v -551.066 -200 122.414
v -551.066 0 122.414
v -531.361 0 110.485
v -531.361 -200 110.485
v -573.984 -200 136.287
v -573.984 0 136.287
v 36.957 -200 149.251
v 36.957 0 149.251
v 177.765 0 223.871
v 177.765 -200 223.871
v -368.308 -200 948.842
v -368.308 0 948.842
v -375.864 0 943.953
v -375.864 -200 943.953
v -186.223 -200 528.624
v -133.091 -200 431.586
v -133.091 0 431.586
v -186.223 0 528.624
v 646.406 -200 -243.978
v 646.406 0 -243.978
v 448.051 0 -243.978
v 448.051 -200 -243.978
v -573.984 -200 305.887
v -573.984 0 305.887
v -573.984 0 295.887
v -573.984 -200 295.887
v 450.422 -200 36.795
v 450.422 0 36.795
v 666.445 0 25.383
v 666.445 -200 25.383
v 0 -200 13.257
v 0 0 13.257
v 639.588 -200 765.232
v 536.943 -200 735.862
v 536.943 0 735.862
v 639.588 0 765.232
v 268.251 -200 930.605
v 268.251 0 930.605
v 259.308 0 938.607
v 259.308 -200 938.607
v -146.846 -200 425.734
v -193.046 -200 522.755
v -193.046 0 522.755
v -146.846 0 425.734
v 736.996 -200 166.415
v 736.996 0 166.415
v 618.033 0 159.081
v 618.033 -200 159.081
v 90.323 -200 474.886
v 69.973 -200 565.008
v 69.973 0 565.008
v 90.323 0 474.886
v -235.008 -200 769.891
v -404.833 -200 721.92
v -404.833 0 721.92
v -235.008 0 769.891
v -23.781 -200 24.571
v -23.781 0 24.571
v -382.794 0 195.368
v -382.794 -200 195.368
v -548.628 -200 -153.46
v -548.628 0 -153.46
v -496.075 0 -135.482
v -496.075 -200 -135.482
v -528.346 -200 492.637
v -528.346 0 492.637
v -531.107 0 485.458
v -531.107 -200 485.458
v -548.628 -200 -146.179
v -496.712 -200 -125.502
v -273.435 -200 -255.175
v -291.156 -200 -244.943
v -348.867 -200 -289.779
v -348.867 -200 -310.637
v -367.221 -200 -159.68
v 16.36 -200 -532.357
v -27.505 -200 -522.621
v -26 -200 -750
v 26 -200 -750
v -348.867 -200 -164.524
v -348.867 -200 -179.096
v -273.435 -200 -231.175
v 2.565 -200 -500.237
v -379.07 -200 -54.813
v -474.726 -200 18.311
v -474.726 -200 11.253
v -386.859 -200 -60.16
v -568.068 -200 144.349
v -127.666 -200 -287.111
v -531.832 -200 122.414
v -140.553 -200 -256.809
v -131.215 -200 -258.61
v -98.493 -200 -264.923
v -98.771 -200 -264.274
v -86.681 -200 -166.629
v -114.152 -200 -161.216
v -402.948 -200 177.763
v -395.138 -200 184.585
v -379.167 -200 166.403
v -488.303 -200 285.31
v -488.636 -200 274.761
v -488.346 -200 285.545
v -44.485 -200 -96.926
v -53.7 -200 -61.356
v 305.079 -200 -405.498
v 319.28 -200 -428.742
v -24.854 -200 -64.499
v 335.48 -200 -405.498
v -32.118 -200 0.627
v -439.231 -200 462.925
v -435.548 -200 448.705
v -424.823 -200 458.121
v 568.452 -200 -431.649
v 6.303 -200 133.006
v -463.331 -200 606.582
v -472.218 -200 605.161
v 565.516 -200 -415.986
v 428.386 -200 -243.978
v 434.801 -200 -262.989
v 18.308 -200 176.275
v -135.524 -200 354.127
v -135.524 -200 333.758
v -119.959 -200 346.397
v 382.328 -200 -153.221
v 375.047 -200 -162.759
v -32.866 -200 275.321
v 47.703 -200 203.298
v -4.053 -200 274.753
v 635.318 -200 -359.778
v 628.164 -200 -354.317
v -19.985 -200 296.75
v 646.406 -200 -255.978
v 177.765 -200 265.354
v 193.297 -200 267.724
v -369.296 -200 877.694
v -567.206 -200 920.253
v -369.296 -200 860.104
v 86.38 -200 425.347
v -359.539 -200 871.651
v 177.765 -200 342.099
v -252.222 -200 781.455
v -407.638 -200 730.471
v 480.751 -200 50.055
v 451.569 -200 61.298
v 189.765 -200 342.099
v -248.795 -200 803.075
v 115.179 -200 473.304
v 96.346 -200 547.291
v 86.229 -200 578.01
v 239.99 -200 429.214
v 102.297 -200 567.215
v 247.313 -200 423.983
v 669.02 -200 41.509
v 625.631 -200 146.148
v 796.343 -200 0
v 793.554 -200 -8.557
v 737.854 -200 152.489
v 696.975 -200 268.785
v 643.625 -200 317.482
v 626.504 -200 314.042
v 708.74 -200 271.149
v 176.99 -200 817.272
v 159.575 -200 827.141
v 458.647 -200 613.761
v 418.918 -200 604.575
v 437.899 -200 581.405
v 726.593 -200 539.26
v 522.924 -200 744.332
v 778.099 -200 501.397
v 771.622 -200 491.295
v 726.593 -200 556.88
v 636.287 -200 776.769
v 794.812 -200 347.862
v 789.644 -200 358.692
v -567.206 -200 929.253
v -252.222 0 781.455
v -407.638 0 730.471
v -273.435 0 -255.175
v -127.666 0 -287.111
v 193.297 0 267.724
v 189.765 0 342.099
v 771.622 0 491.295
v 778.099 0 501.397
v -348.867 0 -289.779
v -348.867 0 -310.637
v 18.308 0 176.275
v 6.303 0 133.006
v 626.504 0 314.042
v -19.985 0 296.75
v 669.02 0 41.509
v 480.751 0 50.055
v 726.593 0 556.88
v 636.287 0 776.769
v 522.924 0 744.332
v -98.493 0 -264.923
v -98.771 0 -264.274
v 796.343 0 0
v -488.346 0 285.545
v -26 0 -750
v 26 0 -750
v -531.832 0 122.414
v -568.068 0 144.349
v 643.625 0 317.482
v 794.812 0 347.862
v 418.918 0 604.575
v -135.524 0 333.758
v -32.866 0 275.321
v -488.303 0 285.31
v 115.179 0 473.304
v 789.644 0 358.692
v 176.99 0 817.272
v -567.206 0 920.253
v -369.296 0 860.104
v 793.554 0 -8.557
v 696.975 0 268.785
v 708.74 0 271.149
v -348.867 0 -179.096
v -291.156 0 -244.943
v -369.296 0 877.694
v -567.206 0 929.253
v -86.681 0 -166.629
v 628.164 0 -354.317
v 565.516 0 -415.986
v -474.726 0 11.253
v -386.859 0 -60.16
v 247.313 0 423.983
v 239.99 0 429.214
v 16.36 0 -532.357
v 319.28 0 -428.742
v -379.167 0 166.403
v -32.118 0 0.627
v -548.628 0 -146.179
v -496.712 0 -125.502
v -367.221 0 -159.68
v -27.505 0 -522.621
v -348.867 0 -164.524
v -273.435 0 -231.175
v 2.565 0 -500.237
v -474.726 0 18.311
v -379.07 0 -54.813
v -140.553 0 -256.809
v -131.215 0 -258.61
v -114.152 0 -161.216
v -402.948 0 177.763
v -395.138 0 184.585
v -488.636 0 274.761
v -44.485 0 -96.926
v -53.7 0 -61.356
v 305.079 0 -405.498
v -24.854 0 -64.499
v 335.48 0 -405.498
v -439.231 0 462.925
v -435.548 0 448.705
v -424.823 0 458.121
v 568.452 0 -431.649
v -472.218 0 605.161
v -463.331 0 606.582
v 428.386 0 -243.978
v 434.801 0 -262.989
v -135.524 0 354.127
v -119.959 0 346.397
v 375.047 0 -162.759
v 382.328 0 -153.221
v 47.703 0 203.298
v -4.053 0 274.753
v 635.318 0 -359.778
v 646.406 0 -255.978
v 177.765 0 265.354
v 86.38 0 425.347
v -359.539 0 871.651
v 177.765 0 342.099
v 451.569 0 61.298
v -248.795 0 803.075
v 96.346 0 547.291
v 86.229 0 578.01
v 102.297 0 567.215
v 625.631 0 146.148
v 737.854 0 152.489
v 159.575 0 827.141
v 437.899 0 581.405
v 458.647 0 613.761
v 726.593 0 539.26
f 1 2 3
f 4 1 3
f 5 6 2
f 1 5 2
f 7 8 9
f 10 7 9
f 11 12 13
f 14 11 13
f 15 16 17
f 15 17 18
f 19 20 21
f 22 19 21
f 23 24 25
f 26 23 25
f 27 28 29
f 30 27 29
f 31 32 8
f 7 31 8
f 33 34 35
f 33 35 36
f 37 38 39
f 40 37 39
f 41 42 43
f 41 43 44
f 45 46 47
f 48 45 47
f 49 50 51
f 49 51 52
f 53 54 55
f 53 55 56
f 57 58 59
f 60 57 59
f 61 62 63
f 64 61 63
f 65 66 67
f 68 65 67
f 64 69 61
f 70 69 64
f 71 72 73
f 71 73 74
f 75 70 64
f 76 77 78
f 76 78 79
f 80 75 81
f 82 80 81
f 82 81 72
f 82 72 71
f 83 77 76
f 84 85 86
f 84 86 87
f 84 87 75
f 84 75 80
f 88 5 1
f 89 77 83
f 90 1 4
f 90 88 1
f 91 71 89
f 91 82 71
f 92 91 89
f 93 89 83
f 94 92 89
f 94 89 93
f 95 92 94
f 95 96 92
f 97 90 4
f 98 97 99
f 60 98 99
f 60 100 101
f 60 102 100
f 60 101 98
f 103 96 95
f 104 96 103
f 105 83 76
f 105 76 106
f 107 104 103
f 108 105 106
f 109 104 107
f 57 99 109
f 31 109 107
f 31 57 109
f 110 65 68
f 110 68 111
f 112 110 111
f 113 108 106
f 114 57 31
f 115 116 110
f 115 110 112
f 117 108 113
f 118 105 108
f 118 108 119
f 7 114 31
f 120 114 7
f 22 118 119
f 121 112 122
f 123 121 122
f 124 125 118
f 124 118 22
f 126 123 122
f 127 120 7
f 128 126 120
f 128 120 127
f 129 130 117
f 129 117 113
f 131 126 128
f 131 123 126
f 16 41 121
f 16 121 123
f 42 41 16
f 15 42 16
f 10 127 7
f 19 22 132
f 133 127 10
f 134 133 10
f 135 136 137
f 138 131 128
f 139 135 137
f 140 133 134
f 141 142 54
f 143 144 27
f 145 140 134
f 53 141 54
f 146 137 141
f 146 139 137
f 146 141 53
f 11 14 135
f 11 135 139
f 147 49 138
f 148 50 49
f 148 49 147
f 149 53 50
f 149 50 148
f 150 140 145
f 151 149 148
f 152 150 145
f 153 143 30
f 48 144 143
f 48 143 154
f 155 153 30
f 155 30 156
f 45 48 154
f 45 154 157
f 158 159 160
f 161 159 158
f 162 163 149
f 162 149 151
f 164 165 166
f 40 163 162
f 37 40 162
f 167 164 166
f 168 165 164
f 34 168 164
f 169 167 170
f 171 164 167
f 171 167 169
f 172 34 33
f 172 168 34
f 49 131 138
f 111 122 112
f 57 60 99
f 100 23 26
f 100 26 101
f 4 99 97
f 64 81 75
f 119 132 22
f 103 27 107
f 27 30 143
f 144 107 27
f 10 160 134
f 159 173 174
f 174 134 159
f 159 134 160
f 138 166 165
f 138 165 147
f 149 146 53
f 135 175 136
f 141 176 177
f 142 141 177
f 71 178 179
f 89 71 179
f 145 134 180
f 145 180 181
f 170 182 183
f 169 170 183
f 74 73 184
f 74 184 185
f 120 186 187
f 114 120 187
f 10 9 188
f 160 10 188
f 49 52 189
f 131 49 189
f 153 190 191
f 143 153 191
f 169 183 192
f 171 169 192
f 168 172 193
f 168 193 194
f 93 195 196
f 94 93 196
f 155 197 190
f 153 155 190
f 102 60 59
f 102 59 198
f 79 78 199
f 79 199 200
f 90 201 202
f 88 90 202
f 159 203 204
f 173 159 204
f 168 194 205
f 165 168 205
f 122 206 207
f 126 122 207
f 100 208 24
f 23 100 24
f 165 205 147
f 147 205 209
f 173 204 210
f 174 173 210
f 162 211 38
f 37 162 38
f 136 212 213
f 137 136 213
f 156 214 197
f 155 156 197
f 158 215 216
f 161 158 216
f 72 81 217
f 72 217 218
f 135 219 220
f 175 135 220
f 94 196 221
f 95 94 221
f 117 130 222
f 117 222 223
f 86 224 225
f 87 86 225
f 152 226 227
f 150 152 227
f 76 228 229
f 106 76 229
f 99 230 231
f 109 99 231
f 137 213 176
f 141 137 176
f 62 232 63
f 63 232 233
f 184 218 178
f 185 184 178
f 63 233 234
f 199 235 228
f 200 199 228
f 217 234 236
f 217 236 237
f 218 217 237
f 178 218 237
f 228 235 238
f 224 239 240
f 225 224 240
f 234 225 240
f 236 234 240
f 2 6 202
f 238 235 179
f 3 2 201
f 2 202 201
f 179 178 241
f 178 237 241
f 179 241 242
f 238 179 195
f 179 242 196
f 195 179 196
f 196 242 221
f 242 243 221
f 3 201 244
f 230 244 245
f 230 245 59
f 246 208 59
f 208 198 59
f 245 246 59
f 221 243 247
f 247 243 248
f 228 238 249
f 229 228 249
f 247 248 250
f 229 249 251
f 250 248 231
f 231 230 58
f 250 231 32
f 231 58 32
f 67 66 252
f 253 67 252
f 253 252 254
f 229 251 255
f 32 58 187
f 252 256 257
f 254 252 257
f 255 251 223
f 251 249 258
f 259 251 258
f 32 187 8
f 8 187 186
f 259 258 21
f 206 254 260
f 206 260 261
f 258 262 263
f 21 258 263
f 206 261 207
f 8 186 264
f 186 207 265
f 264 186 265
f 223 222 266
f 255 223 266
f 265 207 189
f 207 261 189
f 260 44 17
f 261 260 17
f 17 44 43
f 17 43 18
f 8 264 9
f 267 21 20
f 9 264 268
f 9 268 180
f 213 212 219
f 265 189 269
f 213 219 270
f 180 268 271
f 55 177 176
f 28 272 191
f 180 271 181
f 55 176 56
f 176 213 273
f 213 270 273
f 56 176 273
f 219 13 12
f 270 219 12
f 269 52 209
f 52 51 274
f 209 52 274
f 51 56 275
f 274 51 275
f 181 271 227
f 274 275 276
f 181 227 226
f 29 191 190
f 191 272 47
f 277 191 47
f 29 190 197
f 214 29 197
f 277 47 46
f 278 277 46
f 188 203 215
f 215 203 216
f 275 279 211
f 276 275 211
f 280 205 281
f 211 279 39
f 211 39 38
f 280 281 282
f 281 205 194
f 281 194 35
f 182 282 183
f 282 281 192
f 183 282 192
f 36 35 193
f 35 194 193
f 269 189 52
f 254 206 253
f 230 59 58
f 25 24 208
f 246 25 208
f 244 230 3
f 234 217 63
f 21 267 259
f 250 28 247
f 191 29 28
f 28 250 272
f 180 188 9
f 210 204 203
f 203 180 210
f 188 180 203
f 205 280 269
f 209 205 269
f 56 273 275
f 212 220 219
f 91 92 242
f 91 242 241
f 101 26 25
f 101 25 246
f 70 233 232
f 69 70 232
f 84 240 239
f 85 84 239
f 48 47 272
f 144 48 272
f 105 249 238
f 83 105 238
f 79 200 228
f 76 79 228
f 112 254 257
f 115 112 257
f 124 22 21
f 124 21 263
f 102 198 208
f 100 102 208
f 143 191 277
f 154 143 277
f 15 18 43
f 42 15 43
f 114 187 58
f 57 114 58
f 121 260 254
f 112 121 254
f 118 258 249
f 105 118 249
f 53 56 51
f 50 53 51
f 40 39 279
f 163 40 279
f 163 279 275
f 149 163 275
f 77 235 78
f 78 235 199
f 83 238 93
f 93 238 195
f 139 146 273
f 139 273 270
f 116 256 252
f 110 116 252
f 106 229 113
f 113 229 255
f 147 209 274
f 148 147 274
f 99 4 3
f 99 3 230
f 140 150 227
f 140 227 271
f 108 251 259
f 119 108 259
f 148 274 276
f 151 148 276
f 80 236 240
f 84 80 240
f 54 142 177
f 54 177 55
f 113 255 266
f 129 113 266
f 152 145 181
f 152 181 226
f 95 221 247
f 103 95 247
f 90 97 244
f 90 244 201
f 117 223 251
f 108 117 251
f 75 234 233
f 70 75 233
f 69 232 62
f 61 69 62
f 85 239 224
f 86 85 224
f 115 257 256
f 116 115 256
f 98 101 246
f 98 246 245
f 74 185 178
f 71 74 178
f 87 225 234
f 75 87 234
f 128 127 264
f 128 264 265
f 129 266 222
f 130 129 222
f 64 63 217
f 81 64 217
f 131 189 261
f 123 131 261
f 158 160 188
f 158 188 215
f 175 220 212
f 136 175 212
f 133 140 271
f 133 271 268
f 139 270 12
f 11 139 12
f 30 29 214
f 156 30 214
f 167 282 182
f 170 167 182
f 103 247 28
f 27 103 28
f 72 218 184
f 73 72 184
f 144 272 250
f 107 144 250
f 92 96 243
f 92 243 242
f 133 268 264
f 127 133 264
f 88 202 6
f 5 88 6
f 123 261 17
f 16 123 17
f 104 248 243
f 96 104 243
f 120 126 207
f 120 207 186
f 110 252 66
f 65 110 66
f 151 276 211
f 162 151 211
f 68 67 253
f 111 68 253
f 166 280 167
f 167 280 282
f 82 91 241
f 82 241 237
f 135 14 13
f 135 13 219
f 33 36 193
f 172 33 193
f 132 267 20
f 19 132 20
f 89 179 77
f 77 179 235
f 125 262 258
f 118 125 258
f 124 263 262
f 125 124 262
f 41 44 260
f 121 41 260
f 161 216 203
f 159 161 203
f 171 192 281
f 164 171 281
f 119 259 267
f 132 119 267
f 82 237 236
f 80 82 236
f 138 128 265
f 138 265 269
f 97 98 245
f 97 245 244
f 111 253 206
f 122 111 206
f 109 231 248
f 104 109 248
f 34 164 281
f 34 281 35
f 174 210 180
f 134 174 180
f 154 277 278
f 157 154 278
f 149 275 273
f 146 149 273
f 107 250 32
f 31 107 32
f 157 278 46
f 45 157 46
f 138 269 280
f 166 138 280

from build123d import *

# Parameters (mm, degrees)
F1_DEPTH = 200


with BuildPart() as f1:
    # F0 (on Front) → F1 (new body)
    with BuildSketch(Plane.XZ):
        Polygon((-369.296074, 860.103846), (-252.222359, 781.455187), (-248.795434, 803.075274), (-359.538714, 871.651432), (-369.296074, 877.693534), align=None)
        Polygon((86.229337, 578.00982), (102.297463, 567.215454), (176.989675, 817.272305), (159.574956, 827.140868), align=None)
        Polygon((47.703233, 203.298303), (36.957281, 149.250944), (177.764803, 223.871082), (177.764803, 265.354425), align=None)
        Polygon((-395.137998, 184.585006), (-382.793993, 195.368357), (-488.34646, 285.545486), (-488.302618, 285.309941), (-488.635778, 274.76051), align=None)
        Polygon((-531.360984, 110.484615), (-379.167348, 166.403156), (-402.947897, 177.762512), (-531.832361, 122.413635), align=None)
        Polygon((2.565403, -500.237301), (16.359659, -532.357335), (319.279872, -428.741529), (305.078506, -405.49764), align=None)
        Polygon((-19.985075, 296.750159), (-4.052614, 274.753479), (86.380119, 425.346863), (115.178615, 473.303646), (90.32318, 474.886388), align=None)
        Polygon((-27.504601, -522.620559), (16.359659, -532.357335), (2.565403, -500.237301), (-98.492666, -264.92278), (-98.84321, -264.855158), (-131.214753, -258.610427), (-140.553485, -256.808911), (-137.378573, -264.274074), (-127.665923, -287.111413), align=None)
        Polygon((-24.854315, -64.498566), (-44.484516, -96.92555), (450.421533, 36.795169), (467.866212, 41.508619), (451.568961, 61.298091), align=None)
        Polygon((-348.866686, -310.636839), (-273.434583, -255.175081), (-273.434583, -231.175081), (-291.156466, -244.943347), (-348.866686, -289.778855), align=None)
        Polygon((-379.167348, 166.403156), (-32.11826, 0.626743), (-23.780994, 24.570884), (-382.793993, 195.368357), (-395.137998, 184.585006), (-402.947897, 177.762512), align=None)
        Polygon((-439.231479, 462.925151), (-424.822895, 458.121201), (-463.330506, 606.581709), (-472.21759, 605.160534), align=None)
        Polygon((115.178615, 473.303646), (86.380119, 425.346863), (437.898695, 581.404746), (418.918312, 604.574621), align=None)
        Polygon((-404.833034, 721.9197), (-235.007594, 769.890523), (-252.222359, 781.455187), (-407.638371, 730.471313), align=None)
        Polygon((-135.523954, 354.126599), (-119.959313, 346.397221), (-133.090726, 431.585663), (-186.222941, 528.623852), (-193.045956, 522.75474), (-146.845546, 425.733876), align=None)
        Polygon((458.64677, 613.760918), (437.898695, 581.404746), (726.593494, 539.26003), (726.593494, 556.879818), align=None)
        Polygon((636.286535, 776.768744), (522.923824, 744.332003), (536.942677, 735.861683), (639.587648, 765.231731), align=None)
        Polygon((467.866212, 41.508619), (450.421533, 36.795169), (666.4446, 25.382621), (793.553748, -8.556767), (796.343327, 0), (669.01958, 41.508619), (480.751061, 50.054641), align=None)
        Polygon((335.479707, -405.49764), (319.279872, -428.741529), (568.452358, -431.648523), (565.515757, -415.986478), align=None)
        Polygon((-23.780994, 24.570884), (0, 13.257272), (36.957281, 149.250944), (6.303291, 133.006038), align=None)
        Polygon((177.764803, 265.354425), (177.764803, 223.871082), (626.504063, 314.041543), (643.625182, 317.481891), (794.811727, 347.861582), (789.644241, 358.691961), (193.296715, 267.723699), align=None)
        Polygon((-435.548306, 448.704898), (-135.523954, 333.758116), (-135.523954, 354.126599), (-424.822895, 458.121201), align=None)
        Polygon((159.574956, 827.140868), (176.989675, 817.272305), (268.250609, 930.605381), (259.307712, 938.606918), align=None)
        Polygon((-291.156466, -244.943347), (-273.434583, -231.175081), (-348.866686, -164.524183), (-348.866686, -179.095539), align=None)
        Polygon((-114.152497, -161.216129), (-86.680702, -166.629118), (-44.484516, -96.92555), (-24.854315, -64.498566), (-53.700276, -61.355551), align=None)
        Polygon((418.918312, 604.574621), (437.898695, 581.404746), (458.64677, 613.760918), (536.942677, 735.861683), (522.923824, 744.332003), align=None)
        Polygon((-367.221205, -159.679715), (-348.866686, -164.524183), (-379.069601, -54.813134), (-386.85894, -60.159795), align=None)
        Polygon((-135.523954, 333.758116), (-32.865988, 275.321412), (-19.985075, 296.750159), (-119.959313, 346.397221), (-135.523954, 354.126599), align=None)
        Polygon((-98.84321, -264.855158), (-98.492666, -264.92278), (-98.771259, -264.274074), (-86.680702, -166.629118), (-114.152497, -161.216129), (-131.214753, -258.610427), align=None)
        Polygon((-273.434583, -255.175081), (-127.665923, -287.111413), (-137.378573, -264.274074), (-140.553485, -256.808911), (-273.434583, -231.175081), align=None)
        Polygon((736.995518, 166.414723), (618.033409, 159.081429), (625.630806, 146.147769), (737.853944, 152.489179), align=None)
        Polygon((305.078506, -405.49764), (319.279872, -428.741529), (335.479707, -405.49764), (434.80089, -262.989367), (448.050529, -243.978485), (428.385645, -243.978485), align=None)
        Polygon((18.307742, 176.274624), (47.703233, 203.298303), (-4.052614, 274.753479), (-19.985075, 296.750159), (-32.865988, 275.321412), align=None)
        Polygon((375.046786, -162.758924), (428.385645, -243.978485), (448.050529, -243.978485), (382.328452, -153.220721), align=None)
        Polygon((618.033409, 159.081429), (451.568961, 61.298091), (467.866212, 41.508619), (480.751061, 50.054641), (625.630806, 146.147769), align=None)
        Polygon((-567.206264, 920.252979), (-369.296074, 860.103846), (-369.296074, 877.693534), (-567.206264, 929.252979), align=None)
        Polygon((-235.007594, 769.890523), (69.973044, 565.008342), (96.346088, 547.291261), (102.297463, 567.215454), (86.229337, 578.00982), (-248.795434, 803.075274), (-252.222359, 781.455187), align=None)
        Polygon((69.973044, 565.008342), (90.32318, 474.886388), (115.178615, 473.303646), (96.346088, 547.291261), align=None)
        Polygon((-26, -750), (0, -750), (26, -750), (16.359659, -532.357335), (-27.504601, -522.620559), align=None)
        Polygon((177.764803, 342.098653), (177.764803, 265.354425), (193.296715, 267.723699), (189.764803, 342.098653), align=None)
        Polygon((-496.074945, -135.48176), (-496.71203, -125.502074), (-548.627883, -146.178946), (-548.627883, -153.460398), align=None)
        Polygon((726.593494, 556.879818), (726.593494, 539.26003), (771.621823, 491.295099), (778.099352, 501.396665), align=None)
        Polygon((-348.866686, -179.095539), (-348.866686, -164.524183), (-367.221205, -159.679715), (-496.71203, -125.502074), (-496.074945, -135.48176), align=None)
        Polygon((565.515757, -415.986478), (568.452358, -431.648523), (635.317527, -359.778498), (628.163874, -354.317248), align=None)
        Polygon((-369.296074, 877.693534), (-359.538714, 871.651432), (-368.308287, 948.842063), (-375.864416, 943.952799), align=None)
        Polygon((-531.10688, 485.458205), (-435.548306, 448.704898), (-424.822895, 458.121201), (-439.231479, 462.925151), (-528.345922, 492.636694), align=None)
        Polygon((-573.983948, 295.886798), (-488.635778, 274.76051), (-488.302618, 285.309941), (-573.983948, 305.886798), align=None)
        Polygon((6.303291, 133.006038), (36.957281, 149.250944), (47.703233, 203.298303), (18.307742, 176.274624), align=None)
        Polygon((239.989832, 429.213673), (177.764803, 342.098653), (189.764803, 342.098653), (247.313433, 423.982528), align=None)
        Polygon((-386.85894, -60.159795), (-379.069601, -54.813134), (-474.725813, 18.311166), (-474.725813, 11.253227), align=None)
        Polygon((643.625182, 317.481891), (626.504063, 314.041543), (696.974933, 268.784612), (708.739766, 271.148659), align=None)
        Polygon((-32.11826, 0.626743), (-53.700276, -61.355551), (-24.854315, -64.498566), (0, 13.257272), (-23.780994, 24.570884), align=None)
        Polygon((448.050529, -243.978485), (434.80089, -262.989367), (646.405697, -255.978485), (646.405697, -243.978485), align=None)
        Polygon((-551.066445, 122.413635), (-531.360984, 110.484615), (-531.832361, 122.413635), (-568.067963, 144.349445), (-573.983948, 136.287118), align=None)
    extrude(amount=F1_DEPTH)


solid = f1.part
